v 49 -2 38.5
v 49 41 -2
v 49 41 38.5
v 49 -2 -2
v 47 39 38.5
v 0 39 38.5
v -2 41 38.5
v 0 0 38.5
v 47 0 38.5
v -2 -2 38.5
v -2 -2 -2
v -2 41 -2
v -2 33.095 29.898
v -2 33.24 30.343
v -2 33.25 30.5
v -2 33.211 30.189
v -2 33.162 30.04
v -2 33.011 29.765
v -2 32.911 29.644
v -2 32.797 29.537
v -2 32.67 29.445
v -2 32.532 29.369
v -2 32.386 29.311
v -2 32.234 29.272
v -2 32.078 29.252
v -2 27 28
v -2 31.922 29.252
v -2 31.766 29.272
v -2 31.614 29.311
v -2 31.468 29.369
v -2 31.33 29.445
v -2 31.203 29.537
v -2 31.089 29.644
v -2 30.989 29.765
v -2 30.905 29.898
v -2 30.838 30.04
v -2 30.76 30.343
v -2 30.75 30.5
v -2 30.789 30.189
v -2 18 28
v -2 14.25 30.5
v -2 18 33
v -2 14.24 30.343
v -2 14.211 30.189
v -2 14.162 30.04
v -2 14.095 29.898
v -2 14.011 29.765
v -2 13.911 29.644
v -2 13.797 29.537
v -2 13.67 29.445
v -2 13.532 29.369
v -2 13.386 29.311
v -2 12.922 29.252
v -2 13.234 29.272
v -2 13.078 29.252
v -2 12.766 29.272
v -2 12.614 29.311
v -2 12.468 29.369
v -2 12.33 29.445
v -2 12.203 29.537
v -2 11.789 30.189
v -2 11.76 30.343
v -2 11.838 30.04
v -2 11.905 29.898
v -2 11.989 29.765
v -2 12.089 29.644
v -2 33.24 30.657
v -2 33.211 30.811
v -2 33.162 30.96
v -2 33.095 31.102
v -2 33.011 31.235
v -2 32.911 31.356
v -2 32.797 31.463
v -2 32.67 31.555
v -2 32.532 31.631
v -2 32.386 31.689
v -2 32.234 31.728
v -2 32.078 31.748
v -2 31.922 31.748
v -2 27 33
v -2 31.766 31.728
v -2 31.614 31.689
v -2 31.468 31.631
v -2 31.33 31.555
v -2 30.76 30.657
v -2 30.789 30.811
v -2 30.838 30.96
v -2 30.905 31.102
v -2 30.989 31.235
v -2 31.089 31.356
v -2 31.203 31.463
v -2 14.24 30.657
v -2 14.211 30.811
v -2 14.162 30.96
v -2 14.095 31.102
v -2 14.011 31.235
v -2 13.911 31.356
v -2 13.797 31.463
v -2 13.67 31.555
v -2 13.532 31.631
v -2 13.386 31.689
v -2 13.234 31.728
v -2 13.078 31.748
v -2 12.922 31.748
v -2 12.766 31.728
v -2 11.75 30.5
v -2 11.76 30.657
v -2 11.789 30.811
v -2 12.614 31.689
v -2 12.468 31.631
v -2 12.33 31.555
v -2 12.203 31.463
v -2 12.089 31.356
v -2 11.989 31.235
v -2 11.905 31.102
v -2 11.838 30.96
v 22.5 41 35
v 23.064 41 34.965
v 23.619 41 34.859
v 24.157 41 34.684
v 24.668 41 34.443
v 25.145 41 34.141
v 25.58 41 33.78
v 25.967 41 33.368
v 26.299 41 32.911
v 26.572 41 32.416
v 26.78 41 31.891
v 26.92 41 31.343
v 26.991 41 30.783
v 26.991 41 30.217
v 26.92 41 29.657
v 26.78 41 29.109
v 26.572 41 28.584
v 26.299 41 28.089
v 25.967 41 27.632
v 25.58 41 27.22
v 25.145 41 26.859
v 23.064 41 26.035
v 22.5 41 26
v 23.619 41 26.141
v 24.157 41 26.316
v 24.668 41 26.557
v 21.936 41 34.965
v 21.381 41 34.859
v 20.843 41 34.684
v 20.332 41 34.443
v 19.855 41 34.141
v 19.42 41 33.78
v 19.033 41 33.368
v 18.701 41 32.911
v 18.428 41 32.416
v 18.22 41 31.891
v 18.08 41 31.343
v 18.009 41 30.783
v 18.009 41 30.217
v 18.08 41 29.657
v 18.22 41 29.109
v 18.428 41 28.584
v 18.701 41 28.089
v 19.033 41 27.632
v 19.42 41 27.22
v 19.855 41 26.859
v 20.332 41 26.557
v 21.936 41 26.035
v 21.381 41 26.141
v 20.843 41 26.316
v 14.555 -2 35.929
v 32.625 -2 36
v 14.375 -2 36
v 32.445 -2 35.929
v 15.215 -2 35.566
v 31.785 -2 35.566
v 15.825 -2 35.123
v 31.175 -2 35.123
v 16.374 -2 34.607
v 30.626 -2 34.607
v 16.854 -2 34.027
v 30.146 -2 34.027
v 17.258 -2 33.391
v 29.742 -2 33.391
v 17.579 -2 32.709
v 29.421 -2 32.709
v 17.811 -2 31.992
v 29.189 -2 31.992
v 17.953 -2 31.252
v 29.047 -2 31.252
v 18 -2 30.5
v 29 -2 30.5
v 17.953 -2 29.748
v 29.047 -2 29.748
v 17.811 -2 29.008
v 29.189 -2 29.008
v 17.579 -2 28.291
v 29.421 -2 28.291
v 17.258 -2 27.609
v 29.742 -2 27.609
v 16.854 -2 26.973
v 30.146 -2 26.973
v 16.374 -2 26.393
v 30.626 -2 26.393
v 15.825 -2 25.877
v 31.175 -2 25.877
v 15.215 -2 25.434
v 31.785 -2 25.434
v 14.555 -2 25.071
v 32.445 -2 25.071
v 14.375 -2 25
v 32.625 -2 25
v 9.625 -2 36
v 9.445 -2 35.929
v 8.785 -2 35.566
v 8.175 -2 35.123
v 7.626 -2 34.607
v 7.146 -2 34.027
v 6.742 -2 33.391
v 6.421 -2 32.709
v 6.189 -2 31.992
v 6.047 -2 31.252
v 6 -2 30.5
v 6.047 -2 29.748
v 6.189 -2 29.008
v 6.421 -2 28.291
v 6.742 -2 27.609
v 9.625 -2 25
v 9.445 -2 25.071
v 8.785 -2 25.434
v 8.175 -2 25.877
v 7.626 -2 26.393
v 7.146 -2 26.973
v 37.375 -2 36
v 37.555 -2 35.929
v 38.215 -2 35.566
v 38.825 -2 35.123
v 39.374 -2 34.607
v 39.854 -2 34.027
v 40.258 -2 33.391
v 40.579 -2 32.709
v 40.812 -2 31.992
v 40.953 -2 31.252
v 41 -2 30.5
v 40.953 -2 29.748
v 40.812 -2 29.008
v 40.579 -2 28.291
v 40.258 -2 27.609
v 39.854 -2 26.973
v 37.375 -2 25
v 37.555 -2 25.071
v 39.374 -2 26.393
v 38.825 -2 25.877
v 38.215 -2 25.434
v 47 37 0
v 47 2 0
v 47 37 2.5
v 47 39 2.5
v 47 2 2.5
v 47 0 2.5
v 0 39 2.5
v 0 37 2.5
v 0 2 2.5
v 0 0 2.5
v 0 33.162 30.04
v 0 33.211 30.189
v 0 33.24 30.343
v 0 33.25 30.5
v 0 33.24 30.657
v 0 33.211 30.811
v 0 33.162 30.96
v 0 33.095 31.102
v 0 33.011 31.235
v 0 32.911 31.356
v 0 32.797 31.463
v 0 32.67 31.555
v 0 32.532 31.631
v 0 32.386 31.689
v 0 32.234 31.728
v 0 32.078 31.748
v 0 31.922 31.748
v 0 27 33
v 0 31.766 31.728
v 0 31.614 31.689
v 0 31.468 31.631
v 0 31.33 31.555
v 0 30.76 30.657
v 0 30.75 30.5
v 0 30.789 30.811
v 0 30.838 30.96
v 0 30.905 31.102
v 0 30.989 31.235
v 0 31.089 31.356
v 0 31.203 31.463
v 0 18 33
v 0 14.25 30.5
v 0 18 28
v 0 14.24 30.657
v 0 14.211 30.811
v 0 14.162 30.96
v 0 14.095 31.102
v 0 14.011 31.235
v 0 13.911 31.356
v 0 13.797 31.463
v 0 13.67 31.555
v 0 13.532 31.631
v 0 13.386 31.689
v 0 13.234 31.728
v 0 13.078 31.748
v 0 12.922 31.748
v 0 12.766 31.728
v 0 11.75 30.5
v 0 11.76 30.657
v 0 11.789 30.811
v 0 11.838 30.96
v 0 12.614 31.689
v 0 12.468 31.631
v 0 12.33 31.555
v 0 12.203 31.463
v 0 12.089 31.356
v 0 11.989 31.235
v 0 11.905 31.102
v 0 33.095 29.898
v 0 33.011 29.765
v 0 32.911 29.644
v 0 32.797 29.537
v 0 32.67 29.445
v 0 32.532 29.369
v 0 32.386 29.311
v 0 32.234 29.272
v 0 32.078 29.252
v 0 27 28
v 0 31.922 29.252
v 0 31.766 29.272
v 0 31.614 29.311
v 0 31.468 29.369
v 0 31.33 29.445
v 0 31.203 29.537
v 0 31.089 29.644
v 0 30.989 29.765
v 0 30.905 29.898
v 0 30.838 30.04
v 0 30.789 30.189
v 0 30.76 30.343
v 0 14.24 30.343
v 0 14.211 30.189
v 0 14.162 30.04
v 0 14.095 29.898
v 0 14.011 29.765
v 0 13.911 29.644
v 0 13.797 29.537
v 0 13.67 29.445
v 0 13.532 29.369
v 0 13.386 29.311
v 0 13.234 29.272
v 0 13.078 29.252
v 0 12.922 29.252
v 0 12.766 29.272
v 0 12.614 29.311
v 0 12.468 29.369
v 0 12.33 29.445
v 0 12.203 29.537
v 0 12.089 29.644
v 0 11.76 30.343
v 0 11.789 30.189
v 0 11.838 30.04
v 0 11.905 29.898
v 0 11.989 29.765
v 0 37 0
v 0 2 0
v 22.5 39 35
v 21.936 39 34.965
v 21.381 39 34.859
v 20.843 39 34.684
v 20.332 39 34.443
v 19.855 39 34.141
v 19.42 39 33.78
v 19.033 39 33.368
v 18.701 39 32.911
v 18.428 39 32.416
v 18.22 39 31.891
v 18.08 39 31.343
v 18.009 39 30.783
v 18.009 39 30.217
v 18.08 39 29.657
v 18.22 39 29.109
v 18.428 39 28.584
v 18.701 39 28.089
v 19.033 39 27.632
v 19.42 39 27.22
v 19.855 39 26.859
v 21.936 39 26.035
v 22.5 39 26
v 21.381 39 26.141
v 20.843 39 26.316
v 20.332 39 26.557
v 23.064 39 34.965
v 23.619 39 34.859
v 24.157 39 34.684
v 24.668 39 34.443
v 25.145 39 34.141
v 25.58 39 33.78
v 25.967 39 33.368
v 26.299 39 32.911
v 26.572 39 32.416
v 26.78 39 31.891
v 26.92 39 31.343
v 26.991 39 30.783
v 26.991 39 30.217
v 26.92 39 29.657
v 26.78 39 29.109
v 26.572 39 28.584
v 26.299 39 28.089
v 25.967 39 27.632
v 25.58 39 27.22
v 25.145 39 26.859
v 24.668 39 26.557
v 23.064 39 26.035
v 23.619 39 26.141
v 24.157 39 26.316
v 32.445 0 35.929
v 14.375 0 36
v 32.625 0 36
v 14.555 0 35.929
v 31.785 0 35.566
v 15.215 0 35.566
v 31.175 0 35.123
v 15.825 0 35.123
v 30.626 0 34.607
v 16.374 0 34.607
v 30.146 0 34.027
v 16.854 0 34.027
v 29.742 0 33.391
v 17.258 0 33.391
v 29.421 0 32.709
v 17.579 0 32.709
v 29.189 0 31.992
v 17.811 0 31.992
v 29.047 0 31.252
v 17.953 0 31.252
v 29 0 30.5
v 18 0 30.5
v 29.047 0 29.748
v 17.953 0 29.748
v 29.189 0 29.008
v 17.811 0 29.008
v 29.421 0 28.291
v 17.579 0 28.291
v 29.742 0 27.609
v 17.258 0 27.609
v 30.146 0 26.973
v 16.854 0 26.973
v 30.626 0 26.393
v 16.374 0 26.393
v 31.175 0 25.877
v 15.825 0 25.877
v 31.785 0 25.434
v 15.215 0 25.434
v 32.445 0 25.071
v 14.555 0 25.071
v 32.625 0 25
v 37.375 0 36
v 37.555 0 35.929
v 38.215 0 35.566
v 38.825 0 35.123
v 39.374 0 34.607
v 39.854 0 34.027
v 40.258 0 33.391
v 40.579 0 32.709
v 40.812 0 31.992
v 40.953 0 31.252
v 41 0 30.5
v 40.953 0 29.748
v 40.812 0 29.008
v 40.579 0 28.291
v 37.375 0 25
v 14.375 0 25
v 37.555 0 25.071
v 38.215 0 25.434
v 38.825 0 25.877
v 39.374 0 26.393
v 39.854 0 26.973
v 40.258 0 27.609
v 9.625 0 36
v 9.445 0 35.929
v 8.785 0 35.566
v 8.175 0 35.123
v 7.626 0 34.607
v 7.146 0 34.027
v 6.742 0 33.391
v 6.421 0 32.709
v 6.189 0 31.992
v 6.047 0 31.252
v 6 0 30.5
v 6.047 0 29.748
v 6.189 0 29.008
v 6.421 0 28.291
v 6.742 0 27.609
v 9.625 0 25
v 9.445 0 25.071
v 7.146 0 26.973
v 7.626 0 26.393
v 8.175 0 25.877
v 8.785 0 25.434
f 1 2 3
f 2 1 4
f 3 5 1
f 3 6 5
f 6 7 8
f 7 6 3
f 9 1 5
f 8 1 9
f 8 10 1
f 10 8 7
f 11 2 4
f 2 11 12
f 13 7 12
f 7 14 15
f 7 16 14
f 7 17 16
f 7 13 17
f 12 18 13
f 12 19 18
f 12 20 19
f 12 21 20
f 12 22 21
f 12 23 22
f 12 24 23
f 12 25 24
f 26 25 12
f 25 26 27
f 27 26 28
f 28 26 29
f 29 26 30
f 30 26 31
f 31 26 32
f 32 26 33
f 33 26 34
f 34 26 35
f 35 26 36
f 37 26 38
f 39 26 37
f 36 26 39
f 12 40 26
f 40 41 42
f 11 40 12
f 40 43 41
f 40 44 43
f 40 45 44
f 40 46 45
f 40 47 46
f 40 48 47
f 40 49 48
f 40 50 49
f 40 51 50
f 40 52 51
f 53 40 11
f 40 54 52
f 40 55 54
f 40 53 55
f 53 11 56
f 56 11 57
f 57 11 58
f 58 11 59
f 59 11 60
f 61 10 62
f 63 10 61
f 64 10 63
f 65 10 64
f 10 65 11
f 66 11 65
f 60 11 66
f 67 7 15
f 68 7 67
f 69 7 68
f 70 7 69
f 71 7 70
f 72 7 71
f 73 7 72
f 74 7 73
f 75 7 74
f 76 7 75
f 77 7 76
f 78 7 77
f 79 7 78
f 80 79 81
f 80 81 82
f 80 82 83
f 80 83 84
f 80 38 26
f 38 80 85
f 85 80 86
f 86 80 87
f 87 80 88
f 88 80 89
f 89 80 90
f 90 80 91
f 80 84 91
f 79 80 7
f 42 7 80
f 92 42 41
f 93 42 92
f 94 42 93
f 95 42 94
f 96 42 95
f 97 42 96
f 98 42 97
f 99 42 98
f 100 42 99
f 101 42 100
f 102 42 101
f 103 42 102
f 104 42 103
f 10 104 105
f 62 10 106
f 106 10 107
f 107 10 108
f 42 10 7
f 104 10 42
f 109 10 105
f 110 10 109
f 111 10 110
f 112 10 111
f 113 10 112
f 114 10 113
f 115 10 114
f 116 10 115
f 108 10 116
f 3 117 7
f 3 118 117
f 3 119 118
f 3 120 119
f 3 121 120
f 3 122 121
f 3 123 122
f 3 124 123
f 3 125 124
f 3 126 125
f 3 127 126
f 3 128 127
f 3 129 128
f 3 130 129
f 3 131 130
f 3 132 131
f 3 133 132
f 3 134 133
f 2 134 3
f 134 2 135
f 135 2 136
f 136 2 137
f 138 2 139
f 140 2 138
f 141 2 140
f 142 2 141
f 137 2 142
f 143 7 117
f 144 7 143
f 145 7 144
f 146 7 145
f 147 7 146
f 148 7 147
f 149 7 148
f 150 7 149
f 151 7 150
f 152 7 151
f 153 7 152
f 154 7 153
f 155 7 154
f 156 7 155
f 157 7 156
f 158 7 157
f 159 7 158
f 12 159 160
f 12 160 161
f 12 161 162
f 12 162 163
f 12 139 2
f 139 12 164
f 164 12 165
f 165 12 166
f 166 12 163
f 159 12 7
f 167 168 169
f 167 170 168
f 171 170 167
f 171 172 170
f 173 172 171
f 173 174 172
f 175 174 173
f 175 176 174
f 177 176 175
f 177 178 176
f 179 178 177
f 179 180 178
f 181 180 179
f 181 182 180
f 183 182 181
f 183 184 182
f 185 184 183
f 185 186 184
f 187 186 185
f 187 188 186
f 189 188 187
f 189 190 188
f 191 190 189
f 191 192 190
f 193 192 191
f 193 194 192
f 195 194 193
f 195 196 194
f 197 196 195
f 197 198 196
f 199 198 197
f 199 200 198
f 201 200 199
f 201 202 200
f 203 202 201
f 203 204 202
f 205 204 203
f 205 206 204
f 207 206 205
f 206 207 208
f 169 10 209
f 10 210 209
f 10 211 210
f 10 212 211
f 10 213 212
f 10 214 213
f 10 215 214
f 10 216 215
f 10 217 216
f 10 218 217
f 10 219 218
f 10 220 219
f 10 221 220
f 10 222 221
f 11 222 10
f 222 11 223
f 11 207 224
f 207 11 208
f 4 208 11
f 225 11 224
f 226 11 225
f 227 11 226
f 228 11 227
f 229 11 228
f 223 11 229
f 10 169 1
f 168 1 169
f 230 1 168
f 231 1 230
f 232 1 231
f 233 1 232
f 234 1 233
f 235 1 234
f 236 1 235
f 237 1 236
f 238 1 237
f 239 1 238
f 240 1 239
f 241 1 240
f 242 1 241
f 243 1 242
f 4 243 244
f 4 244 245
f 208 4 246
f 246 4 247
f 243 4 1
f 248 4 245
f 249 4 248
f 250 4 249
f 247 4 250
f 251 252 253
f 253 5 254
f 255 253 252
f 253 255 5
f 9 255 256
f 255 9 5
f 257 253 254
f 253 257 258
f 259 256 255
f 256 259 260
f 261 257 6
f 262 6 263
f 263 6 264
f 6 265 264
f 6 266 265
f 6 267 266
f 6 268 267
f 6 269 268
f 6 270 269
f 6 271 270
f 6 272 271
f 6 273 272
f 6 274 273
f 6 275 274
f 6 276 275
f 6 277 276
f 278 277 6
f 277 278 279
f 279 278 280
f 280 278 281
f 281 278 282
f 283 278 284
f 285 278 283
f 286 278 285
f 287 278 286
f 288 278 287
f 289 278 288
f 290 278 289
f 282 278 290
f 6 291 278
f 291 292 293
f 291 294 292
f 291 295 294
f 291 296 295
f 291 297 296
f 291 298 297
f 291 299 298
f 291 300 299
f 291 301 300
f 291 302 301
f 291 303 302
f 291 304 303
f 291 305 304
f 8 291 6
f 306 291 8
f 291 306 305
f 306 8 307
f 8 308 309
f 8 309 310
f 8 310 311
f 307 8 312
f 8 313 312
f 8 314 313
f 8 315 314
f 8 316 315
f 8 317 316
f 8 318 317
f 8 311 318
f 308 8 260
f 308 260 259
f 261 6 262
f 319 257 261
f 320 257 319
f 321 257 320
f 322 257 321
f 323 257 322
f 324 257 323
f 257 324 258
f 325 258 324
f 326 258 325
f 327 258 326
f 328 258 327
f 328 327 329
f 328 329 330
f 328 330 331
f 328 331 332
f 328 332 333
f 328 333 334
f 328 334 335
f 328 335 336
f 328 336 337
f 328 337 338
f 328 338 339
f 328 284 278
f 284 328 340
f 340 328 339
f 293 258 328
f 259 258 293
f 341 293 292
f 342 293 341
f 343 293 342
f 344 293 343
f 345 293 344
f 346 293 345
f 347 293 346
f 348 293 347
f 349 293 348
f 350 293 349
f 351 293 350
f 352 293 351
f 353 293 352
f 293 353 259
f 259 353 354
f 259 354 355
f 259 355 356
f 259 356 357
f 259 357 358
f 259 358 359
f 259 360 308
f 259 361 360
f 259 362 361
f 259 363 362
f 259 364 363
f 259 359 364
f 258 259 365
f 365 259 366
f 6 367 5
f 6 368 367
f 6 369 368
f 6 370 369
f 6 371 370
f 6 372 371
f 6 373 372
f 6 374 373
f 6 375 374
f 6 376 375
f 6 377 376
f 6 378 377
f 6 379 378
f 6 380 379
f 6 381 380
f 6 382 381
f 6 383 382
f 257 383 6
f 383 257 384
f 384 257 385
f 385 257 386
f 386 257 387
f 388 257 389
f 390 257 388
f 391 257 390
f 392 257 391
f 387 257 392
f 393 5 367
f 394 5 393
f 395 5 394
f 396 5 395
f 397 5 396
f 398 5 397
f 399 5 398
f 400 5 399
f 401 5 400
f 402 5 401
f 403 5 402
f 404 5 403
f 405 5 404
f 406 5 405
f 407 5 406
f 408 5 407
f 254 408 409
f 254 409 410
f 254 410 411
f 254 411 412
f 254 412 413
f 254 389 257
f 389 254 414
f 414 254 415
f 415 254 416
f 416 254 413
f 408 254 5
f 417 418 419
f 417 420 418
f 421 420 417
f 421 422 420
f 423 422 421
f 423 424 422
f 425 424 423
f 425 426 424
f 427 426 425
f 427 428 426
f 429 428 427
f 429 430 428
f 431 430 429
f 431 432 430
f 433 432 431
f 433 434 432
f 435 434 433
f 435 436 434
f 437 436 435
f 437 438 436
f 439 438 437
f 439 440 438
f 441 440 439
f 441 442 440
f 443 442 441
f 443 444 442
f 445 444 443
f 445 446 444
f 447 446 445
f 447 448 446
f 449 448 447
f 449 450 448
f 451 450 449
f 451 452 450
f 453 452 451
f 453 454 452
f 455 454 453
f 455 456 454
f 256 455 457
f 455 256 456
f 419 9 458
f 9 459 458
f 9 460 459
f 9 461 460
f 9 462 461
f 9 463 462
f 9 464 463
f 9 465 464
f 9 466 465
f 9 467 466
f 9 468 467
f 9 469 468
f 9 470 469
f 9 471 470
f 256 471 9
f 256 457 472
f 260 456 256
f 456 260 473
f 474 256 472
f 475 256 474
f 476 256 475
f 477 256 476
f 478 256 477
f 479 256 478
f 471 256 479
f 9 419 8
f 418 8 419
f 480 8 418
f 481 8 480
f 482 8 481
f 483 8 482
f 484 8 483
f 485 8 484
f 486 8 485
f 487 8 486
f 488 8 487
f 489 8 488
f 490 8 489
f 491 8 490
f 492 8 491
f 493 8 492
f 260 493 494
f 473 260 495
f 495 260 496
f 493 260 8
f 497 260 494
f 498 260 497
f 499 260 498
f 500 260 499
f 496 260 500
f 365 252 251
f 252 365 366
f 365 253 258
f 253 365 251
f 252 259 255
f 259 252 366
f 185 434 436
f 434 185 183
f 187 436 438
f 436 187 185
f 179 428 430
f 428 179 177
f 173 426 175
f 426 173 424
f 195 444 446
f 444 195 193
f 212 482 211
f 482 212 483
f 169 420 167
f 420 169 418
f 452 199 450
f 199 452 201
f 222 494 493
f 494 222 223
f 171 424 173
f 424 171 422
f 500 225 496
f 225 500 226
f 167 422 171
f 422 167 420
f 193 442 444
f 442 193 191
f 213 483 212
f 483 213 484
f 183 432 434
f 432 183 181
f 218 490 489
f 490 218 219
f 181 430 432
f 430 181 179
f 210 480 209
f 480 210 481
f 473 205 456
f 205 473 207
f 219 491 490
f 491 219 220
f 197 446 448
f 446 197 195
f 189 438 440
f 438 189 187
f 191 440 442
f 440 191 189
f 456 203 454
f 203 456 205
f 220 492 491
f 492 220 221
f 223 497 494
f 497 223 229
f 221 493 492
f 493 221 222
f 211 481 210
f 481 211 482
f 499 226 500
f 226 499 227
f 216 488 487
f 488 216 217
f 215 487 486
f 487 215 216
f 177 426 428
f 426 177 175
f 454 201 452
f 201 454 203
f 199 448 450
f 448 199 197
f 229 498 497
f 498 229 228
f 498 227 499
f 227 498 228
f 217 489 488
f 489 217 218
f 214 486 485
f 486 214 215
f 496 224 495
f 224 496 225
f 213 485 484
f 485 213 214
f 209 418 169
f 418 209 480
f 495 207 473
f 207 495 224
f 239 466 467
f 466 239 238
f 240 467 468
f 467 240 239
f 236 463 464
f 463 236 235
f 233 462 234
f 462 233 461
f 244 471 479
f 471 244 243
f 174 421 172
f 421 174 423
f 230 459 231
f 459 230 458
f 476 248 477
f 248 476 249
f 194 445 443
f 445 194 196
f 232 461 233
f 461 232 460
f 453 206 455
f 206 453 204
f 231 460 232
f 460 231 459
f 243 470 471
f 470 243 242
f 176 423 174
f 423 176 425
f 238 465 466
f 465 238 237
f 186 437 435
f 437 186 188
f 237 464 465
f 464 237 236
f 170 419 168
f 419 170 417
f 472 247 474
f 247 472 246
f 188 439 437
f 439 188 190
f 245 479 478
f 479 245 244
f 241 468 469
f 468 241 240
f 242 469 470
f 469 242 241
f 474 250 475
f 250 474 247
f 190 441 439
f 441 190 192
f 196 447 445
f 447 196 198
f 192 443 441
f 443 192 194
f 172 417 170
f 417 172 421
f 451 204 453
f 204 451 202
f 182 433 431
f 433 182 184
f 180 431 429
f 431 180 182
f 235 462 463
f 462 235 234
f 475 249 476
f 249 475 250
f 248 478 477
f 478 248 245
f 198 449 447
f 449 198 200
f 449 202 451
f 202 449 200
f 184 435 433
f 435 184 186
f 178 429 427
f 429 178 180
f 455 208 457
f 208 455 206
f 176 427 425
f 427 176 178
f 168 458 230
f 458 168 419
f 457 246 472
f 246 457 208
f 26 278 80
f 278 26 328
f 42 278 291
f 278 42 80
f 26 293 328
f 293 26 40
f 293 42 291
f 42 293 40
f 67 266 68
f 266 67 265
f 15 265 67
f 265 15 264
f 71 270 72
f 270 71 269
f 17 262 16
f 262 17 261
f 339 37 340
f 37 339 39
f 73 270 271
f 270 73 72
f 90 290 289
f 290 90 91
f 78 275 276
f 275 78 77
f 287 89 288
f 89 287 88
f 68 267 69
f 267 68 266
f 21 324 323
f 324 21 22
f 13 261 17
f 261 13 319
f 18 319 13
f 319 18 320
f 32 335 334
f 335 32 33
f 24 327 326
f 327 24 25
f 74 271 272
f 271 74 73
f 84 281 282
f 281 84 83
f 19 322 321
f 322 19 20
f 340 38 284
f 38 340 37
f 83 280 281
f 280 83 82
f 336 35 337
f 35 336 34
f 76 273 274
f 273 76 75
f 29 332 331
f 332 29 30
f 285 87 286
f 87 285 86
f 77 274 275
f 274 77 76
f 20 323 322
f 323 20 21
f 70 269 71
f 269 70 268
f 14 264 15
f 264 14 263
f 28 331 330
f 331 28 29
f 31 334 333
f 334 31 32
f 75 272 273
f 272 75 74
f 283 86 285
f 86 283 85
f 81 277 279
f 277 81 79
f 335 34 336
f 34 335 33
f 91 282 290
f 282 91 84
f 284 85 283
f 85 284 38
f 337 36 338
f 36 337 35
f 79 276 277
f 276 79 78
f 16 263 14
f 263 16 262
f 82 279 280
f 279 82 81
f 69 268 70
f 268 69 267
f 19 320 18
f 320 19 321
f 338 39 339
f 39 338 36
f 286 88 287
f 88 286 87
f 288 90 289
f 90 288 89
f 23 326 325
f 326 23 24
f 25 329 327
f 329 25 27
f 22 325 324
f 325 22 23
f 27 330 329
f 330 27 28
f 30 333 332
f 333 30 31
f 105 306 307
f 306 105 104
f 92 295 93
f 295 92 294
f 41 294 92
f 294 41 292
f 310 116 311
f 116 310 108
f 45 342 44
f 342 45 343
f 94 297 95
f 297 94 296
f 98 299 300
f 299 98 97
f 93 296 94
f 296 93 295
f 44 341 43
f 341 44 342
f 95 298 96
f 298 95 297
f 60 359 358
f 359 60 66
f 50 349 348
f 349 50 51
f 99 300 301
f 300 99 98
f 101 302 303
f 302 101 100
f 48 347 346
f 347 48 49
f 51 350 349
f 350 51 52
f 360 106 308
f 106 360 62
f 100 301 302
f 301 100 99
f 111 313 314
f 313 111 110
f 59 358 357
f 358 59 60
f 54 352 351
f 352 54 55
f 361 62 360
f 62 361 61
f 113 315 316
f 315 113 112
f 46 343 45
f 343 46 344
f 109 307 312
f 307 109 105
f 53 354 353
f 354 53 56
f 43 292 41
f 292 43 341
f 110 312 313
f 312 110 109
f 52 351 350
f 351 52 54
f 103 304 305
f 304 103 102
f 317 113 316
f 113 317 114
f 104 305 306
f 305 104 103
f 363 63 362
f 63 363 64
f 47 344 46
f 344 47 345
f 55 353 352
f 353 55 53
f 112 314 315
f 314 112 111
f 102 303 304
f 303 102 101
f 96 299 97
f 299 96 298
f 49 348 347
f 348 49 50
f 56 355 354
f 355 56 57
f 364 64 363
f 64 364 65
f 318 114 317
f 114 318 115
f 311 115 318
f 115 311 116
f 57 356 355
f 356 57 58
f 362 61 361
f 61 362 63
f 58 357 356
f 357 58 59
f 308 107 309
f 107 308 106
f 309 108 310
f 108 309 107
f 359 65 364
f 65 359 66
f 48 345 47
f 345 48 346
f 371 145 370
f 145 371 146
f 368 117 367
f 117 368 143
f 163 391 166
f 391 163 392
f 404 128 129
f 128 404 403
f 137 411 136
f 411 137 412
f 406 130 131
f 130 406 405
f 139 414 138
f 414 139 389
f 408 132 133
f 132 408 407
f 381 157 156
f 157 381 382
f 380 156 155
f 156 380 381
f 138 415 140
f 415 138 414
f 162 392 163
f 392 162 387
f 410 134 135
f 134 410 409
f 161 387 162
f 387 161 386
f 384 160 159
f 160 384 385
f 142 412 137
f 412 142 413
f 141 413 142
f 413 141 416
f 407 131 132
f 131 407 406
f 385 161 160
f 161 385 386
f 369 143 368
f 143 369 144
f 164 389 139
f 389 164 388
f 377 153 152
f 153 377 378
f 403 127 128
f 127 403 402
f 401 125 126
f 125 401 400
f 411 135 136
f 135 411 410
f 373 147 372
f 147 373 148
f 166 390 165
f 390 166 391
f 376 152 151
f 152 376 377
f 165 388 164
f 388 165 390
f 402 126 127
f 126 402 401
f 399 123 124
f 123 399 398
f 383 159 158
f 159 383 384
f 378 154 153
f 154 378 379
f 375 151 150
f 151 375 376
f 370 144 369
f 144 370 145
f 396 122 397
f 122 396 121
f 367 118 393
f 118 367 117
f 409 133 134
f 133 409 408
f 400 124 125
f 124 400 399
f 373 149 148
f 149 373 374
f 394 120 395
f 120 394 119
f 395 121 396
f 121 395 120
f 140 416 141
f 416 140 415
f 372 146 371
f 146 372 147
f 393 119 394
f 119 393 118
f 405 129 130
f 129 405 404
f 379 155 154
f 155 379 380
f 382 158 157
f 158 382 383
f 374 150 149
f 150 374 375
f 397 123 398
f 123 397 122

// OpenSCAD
pcb_x = 45;
pcb_y = 37;
pcb_z = 2;
pcb_pad = 1;
wall = 2;

elem_h = 14;
under_pcb_h = 2.5;

height = wall+under_pcb_h+pcb_z+elem_h;
echo("height:", height);
full_height = height+20;
echo("full height:", full_height);

banana_hole_z = wall+under_pcb_h+pcb_z+elem_h+10;


banana_hole_d = 12;

volt_meter_x = 48;
volt_meter_y = 29;
volt_meter_h = 25;

$fn = 50;

module switch_holes() {
  cube([9, 50, 5], center=true);
  translate([9.5, 0, 0]) {
    rotate([90, 0, 0]) {
      cylinder(d=2.5, h = 50, center=true);
    }
  }
  translate([-9.5, 0, 0]) {
    rotate([90, 0, 0]) {
      cylinder(d=2.5, h = 50, center=true);
    }
  }
}

module banana_female_hole() {
  h = 20;
  rotate([90, 0, 0]) {
    difference() {
      cylinder(d=banana_hole_d, h=h);
      translate([-10, banana_hole_d/2-0.5, 0]) {
        cube([20, 5, h]);
      }
      translate([-10, -banana_hole_d/2-5+0.5, 0]) {
        cube([20, 5, h]);
      }
    }
  }
}

module high_volt_box() {
  difference() {
    translate([-wall, -wall, -wall]) {
      cube([pcb_x+pcb_pad*2+wall*2, pcb_y+pcb_pad*2+wall*2, full_height]);
    }
    translate([0, 0, under_pcb_h]) {
      cube([pcb_x+pcb_pad*2, pcb_y+pcb_pad*2, 50]);
    }
    translate([0, 2, 0]) {
      cube([pcb_x+pcb_pad*2, pcb_y+pcb_pad*2-4, under_pcb_h]);
    }
  }
}

difference() {
  high_volt_box();
  translate([12, 10, banana_hole_z]) {
    banana_female_hole();
  }
  translate([pcb_x-12+wall, 10, banana_hole_z]) {
    banana_female_hole();
  }
  // power hole
  translate([pcb_x/2, pcb_y+8, banana_hole_z]) {
    rotate([90, 90, 0]) {
      cylinder(d=9, h=10);
    }
  }
  // power switch hole
  translate([0, pcb_x/2, banana_hole_z]) {
    rotate([0, 0, 90]) {
      switch_holes();
    }
  }
}
